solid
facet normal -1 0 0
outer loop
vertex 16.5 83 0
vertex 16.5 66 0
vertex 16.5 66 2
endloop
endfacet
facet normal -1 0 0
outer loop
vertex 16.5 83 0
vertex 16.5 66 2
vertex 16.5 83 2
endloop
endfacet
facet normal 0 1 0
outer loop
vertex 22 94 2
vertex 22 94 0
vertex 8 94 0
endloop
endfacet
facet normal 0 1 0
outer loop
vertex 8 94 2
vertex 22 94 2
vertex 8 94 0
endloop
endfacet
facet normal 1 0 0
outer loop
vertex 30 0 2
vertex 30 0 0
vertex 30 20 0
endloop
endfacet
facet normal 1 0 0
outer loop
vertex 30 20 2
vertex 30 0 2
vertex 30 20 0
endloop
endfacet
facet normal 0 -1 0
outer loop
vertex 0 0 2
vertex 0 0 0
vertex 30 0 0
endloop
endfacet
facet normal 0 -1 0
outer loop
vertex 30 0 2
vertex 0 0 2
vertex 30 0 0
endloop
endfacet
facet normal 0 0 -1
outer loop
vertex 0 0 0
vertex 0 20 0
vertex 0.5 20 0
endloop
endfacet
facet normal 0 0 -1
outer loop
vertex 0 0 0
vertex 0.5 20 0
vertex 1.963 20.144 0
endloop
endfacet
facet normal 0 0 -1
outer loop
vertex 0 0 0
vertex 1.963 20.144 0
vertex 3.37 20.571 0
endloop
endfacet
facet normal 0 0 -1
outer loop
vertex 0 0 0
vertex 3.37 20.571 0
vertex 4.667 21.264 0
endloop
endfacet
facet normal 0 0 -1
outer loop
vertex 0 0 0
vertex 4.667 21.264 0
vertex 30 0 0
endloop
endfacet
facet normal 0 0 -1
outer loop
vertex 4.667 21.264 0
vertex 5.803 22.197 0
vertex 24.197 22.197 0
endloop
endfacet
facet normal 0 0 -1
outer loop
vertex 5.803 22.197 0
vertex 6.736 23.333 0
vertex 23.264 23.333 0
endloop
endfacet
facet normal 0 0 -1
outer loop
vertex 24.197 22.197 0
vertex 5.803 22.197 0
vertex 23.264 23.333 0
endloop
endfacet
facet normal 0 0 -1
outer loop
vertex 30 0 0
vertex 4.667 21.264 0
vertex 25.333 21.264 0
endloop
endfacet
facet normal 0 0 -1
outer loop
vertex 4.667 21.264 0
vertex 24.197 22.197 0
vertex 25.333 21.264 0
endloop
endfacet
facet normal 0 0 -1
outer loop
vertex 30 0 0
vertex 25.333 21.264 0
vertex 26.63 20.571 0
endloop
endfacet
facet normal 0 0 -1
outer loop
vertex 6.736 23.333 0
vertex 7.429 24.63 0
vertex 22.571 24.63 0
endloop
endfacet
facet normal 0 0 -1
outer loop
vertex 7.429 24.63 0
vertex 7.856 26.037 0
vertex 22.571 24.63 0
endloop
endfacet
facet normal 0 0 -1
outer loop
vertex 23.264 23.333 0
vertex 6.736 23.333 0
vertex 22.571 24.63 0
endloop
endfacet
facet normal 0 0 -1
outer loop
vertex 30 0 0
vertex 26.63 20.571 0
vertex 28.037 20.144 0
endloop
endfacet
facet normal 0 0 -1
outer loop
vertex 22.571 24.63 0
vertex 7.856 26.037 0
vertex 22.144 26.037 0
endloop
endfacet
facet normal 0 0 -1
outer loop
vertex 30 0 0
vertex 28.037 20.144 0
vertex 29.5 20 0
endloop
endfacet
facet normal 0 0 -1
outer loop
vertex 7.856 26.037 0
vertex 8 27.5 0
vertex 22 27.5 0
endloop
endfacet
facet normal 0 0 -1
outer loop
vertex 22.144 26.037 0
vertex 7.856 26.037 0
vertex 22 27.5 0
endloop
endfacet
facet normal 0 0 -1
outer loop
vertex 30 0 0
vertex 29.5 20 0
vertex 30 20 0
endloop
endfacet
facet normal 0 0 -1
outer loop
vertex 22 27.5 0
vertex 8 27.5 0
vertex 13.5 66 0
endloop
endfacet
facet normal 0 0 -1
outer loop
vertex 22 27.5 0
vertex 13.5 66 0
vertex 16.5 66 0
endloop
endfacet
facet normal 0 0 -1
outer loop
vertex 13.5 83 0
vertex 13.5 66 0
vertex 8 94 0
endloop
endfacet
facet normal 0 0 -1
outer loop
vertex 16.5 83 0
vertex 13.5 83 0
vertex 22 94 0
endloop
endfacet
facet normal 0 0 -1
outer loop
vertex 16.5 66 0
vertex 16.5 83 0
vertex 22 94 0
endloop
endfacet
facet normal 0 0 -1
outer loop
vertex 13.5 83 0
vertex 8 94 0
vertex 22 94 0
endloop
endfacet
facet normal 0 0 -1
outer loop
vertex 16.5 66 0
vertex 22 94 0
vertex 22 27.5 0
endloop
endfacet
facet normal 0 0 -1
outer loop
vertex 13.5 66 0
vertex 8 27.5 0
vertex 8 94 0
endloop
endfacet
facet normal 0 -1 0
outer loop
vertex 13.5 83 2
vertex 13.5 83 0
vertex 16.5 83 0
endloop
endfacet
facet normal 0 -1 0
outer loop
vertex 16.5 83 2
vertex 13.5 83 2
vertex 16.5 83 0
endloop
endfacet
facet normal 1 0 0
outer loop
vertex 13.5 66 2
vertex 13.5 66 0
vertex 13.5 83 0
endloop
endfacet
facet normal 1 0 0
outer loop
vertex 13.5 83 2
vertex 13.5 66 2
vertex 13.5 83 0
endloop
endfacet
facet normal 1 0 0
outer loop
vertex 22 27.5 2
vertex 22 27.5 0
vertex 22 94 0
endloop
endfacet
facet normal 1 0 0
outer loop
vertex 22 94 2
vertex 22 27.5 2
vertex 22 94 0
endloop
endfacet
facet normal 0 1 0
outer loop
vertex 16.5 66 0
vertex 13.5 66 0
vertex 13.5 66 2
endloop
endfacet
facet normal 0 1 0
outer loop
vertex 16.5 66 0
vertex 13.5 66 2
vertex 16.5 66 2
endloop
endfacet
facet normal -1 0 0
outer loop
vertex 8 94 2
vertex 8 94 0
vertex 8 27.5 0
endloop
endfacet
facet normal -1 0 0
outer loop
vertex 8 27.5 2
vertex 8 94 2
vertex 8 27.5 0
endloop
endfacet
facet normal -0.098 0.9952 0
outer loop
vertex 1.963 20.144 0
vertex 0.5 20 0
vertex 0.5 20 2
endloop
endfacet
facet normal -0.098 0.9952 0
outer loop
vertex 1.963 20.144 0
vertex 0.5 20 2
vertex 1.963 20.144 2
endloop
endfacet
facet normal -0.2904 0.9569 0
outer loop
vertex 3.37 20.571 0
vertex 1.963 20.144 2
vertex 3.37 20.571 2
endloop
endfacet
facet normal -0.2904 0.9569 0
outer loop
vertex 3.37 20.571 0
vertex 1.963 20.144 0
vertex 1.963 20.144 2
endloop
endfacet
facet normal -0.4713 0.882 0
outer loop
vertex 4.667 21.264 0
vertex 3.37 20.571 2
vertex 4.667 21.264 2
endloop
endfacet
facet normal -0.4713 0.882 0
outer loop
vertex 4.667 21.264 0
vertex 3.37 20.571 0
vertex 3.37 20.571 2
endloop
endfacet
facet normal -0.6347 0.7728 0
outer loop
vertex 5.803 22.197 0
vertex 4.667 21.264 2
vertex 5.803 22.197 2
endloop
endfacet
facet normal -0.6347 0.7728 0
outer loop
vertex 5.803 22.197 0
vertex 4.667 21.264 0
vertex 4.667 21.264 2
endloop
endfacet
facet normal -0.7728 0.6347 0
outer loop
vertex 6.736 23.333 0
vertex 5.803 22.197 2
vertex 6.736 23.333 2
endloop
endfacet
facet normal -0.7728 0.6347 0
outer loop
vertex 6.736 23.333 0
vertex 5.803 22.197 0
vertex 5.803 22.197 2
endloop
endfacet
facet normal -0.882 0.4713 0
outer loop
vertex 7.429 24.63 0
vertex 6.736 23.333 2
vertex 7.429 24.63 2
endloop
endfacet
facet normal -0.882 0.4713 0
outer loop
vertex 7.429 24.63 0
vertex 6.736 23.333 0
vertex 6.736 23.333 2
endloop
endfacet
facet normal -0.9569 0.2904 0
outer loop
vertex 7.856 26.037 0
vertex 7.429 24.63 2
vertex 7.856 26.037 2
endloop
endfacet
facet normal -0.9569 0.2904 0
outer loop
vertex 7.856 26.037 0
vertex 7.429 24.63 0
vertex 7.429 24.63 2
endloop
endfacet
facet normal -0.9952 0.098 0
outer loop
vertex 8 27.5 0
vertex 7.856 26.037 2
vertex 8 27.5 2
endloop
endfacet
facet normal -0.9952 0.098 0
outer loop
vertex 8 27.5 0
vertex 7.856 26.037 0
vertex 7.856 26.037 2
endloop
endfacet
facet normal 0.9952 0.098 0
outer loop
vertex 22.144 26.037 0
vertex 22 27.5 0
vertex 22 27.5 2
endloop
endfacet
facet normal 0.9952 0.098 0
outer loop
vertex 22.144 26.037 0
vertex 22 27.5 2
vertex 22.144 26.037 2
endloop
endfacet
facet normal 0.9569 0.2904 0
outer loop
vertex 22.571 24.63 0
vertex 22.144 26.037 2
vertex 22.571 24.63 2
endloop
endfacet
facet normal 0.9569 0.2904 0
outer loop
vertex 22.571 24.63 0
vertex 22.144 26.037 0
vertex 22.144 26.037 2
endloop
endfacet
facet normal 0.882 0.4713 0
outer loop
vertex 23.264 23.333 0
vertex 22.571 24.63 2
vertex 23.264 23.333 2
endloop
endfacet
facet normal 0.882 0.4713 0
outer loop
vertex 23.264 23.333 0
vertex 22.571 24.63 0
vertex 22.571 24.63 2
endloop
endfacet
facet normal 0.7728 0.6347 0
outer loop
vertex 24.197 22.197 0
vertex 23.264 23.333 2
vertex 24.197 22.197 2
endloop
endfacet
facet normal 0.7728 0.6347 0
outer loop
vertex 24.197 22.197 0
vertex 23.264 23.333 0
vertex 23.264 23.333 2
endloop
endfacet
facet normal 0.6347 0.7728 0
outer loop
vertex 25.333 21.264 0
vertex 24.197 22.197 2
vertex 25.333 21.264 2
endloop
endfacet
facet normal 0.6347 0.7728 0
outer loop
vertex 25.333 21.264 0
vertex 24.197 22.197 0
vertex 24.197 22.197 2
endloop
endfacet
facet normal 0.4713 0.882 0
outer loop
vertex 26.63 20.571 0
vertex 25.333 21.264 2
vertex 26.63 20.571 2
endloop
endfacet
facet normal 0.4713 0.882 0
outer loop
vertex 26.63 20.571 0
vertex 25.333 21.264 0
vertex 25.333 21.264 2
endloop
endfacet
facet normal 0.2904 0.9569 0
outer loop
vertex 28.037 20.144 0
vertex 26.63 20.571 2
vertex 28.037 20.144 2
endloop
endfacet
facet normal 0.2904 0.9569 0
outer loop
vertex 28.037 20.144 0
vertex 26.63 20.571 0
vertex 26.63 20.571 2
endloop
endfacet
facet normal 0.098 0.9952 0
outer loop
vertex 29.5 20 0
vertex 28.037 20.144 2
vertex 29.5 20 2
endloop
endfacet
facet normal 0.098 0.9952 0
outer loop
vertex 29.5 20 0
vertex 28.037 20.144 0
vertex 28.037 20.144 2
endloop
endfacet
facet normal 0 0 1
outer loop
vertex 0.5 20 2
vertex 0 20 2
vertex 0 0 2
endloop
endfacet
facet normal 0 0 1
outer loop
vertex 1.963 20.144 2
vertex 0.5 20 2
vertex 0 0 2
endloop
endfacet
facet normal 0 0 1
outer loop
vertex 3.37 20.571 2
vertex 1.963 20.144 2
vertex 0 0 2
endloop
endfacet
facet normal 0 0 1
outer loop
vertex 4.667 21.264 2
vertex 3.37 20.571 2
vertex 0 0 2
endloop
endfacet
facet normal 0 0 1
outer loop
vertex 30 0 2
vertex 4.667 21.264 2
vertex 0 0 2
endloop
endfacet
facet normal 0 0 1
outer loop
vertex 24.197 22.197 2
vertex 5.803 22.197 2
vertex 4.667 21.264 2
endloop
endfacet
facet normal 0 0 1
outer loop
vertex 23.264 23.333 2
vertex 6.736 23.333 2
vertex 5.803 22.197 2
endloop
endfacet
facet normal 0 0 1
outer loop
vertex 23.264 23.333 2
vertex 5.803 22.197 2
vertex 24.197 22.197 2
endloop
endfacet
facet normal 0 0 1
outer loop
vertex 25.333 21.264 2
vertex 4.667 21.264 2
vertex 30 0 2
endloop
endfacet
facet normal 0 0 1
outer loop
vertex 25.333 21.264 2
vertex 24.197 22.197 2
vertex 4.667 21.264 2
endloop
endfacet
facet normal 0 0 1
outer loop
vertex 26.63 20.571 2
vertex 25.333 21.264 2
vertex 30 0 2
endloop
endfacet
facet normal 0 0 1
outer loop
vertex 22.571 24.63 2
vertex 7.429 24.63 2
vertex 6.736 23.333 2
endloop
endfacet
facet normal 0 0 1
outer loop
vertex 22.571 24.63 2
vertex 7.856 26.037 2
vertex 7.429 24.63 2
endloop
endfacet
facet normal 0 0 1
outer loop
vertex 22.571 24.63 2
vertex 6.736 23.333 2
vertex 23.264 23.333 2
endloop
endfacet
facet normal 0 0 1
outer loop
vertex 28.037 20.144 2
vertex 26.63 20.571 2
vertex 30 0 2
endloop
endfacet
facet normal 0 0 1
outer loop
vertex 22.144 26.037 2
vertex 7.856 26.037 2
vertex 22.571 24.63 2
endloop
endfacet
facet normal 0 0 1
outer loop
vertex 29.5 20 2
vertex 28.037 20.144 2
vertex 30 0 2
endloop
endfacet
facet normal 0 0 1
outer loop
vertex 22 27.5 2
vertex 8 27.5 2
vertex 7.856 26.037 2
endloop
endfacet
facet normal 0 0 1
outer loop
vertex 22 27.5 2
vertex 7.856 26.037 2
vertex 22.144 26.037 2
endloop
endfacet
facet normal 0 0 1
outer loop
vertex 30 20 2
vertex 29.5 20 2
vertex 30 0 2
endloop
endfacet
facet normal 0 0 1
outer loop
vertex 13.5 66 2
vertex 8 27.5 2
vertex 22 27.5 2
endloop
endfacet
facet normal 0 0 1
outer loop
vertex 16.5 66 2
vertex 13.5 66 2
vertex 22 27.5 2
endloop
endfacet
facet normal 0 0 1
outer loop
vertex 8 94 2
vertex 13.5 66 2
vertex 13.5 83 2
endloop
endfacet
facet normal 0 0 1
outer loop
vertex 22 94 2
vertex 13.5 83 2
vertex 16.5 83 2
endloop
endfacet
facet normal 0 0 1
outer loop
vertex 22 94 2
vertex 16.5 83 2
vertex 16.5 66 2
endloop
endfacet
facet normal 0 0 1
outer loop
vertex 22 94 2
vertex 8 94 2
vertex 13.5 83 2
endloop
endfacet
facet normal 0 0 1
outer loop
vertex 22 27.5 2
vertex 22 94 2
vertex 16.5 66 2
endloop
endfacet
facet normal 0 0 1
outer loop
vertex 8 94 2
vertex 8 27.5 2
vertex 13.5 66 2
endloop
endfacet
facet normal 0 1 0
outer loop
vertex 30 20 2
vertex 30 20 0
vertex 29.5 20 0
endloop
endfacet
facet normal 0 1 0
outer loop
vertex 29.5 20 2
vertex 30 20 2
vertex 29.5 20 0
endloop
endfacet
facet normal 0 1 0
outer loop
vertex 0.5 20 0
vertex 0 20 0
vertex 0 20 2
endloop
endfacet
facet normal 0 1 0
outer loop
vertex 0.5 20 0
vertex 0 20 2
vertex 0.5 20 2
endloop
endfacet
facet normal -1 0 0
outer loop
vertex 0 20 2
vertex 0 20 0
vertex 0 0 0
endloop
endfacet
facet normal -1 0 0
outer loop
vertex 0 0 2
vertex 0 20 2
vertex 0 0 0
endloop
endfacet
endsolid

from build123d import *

# Parameters (mm, degrees)
COPYSKETCH_W = 3
COPYSKETCH_H = 17
PAD_DEPTH    = 2


with BuildPart() as part:
    # CopySketch → Pad (new body)
    with BuildSketch(Plane.XY):
        with BuildLine():
            Line((0, 0), (30, 0))
            Line((30, 0), (30, 20))
            Line((30, 20), (29.5, 20))
            ThreePointArc((22, 27.5), (24.196699, 22.196699), (29.5, 20))
            Line((22, 27.5), (22, 94))
            Line((22, 94), (8, 94))
            Line((8, 94), (8, 27.5))
            ThreePointArc((0.5, 20), (5.803301, 22.196699), (8, 27.5))
            Line((0, 20), (0.5, 20))
            Line((0, 20), (0, 0))
        make_face()
        with Locations((15, 74.5)):
            Rectangle(COPYSKETCH_W, COPYSKETCH_H, mode=Mode.SUBTRACT)
    extrude(amount=PAD_DEPTH)


solid = part.part
